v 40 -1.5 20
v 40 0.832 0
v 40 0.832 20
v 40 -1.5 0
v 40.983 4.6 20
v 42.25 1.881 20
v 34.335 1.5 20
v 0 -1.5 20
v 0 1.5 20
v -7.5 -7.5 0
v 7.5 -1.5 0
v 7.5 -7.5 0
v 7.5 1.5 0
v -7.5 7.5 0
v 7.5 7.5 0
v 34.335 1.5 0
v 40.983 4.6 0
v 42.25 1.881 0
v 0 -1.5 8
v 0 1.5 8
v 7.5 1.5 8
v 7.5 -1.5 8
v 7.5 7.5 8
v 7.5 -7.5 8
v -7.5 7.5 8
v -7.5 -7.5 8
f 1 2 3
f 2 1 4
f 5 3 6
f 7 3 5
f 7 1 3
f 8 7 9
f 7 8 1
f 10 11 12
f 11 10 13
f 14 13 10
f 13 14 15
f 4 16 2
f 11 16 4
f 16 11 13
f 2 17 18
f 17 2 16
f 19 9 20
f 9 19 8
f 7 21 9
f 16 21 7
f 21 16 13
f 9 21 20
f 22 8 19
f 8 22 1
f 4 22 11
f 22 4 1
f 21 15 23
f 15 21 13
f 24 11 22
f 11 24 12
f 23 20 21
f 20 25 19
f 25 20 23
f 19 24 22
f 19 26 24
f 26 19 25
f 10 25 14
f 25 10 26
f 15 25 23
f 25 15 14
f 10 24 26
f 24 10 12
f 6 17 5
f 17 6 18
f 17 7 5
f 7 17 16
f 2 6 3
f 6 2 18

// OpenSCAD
// Parametric soil cover blade for the seed-planting robot.
// A small blade that pushes loose soil back over the dibbed hole after seed drop.
// Connected to an SG90 servo; retracts at 110 degrees, pushes at 40 degrees.
// Issue #77: Rilascio semi e copertura.

// Parameters (mm)
blade_length = 40;       // total length of the blade
blade_width = 3;         // thickness of the blade
blade_height = 20;       // how tall the blade is
mount_width = 15;        // width of the servo mounting block
mount_height = 8;        // height of the mounting block
horn_hole = 2.5;         // hole for servo horn screw (M2.5)

$fn = 48;
eps = 0.01;

module soil_cover() {
  union() {
    // blade (flat part that scrapes soil)
    translate([0, -blade_width / 2, 0])
      cube([blade_length, blade_width, blade_height]);

    // mounting block at the base of the blade
    translate([-mount_width / 2, -mount_width / 2, 0])
      cube([mount_width, mount_width, mount_height]);

    // servo horn hole
    translate([0, -blade_width / 2, mount_height / 2])
      rotate([90, 0, 0])
        cylinder(h = blade_width + 2 * eps, d = horn_hole, $fn = 16);
  }

  // angled blade tip for self-cleaning
  translate([blade_length - 5, -blade_width / 2, 0])
    rotate([0, 0, 25])
      cube([8, blade_width, blade_height]);
}

soil_cover();
// Print flat (blade down on build plate) for strength.
